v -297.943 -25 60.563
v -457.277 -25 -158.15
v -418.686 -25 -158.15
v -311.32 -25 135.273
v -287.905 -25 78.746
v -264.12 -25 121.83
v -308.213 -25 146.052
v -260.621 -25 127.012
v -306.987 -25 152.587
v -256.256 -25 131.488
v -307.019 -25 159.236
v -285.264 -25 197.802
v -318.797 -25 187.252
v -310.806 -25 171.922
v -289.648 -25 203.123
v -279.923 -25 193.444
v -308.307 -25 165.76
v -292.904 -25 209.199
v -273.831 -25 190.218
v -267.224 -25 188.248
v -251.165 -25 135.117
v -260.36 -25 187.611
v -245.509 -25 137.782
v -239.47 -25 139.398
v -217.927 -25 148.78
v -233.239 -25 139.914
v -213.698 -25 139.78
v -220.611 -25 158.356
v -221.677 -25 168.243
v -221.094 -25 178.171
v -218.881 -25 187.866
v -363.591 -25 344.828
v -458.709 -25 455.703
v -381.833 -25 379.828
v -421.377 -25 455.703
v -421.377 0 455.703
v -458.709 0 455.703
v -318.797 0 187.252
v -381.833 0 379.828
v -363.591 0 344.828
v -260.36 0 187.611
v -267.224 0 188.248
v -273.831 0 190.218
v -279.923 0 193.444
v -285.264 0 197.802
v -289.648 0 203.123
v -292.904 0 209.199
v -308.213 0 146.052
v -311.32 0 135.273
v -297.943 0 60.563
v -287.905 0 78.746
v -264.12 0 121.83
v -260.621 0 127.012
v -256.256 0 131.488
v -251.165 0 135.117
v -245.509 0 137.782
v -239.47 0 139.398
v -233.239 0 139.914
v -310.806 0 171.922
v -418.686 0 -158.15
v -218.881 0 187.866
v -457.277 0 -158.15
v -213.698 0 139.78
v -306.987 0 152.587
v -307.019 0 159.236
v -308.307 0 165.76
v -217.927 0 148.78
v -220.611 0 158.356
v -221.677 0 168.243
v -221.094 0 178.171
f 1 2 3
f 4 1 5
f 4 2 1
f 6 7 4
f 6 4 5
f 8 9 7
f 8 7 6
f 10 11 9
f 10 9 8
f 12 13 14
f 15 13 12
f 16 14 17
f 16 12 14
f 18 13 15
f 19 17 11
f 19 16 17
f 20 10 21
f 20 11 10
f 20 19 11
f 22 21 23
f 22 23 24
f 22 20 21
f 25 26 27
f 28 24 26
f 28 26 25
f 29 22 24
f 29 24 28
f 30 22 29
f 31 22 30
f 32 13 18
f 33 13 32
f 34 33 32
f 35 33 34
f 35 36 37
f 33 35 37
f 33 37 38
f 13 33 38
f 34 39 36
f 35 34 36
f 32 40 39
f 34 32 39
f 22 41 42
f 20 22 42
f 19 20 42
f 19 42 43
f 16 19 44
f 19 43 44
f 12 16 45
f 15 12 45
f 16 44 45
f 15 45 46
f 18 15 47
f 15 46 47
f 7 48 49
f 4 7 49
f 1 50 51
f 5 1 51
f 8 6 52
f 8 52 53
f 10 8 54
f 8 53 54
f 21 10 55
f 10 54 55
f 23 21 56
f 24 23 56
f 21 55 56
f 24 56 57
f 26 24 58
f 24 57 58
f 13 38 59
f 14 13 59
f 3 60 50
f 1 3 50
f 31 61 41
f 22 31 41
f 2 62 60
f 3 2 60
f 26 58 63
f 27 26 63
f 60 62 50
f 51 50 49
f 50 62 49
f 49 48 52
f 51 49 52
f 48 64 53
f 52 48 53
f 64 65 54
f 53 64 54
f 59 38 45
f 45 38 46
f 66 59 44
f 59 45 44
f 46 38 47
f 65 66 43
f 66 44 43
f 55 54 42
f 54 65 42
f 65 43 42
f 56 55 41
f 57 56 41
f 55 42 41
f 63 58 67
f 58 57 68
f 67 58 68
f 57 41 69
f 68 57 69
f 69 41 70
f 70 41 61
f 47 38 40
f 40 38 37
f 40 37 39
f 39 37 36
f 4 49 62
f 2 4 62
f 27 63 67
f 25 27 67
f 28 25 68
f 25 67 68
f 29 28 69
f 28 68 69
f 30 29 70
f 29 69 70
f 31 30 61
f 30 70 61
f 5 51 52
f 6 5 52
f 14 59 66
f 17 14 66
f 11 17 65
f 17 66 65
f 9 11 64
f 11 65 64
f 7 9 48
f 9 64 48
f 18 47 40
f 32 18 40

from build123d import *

# Parameters (mm, degrees)
F2_DEPTH = 25


with BuildPart() as f2:
    # F1 (on face) → F2 (new body)
    with BuildSketch(Plane.XZ):
        with BuildLine():
            Line((-297.94293, 60.56272), (-287.904638, 78.745993))
            Line((-287.904638, 78.745993), (-264.119575, 121.830047))
            ThreePointArc((-264.119575, 121.830047), (-251.165034, 135.11697), (-233.238659, 139.913584))
            Line((-233.238659, 139.913584), (-213.697833, 139.779545))
            ThreePointArc((-213.697833, 139.779545), (-221.348908, 163.277257), (-218.880566, 187.865643))
            Line((-218.880566, 187.865643), (-260.360033, 187.611007))
            ThreePointArc((-260.360033, 187.611007), (-279.922741, 193.444261), (-292.903603, 209.199373))
            Line((-292.903603, 209.199373), (-363.591224, 344.828208))
            Line((-363.591224, 344.828208), (-381.832675, 379.828208))
            Line((-381.832675, 379.828208), (-421.377269, 455.702698))
            Line((-421.377269, 455.702698), (-458.70873, 455.702698))
            Line((-458.70873, 455.702698), (-318.796581, 187.252275))
            Line((-318.796581, 187.252275), (-310.806441, 171.921537))
            ThreePointArc((-310.806441, 171.921537), (-307.018527, 159.236472), (-308.213044, 146.051924))
            Line((-308.213044, 146.051924), (-311.319953, 135.27254))
            Line((-311.319953, 135.27254), (-457.277019, -158.149611))
            Line((-457.277019, -158.149611), (-418.685669, -158.149611))
            Line((-418.685669, -158.149611), (-297.94293, 60.56272))
        make_face()
    extrude(amount=F2_DEPTH)


solid = f2.part
